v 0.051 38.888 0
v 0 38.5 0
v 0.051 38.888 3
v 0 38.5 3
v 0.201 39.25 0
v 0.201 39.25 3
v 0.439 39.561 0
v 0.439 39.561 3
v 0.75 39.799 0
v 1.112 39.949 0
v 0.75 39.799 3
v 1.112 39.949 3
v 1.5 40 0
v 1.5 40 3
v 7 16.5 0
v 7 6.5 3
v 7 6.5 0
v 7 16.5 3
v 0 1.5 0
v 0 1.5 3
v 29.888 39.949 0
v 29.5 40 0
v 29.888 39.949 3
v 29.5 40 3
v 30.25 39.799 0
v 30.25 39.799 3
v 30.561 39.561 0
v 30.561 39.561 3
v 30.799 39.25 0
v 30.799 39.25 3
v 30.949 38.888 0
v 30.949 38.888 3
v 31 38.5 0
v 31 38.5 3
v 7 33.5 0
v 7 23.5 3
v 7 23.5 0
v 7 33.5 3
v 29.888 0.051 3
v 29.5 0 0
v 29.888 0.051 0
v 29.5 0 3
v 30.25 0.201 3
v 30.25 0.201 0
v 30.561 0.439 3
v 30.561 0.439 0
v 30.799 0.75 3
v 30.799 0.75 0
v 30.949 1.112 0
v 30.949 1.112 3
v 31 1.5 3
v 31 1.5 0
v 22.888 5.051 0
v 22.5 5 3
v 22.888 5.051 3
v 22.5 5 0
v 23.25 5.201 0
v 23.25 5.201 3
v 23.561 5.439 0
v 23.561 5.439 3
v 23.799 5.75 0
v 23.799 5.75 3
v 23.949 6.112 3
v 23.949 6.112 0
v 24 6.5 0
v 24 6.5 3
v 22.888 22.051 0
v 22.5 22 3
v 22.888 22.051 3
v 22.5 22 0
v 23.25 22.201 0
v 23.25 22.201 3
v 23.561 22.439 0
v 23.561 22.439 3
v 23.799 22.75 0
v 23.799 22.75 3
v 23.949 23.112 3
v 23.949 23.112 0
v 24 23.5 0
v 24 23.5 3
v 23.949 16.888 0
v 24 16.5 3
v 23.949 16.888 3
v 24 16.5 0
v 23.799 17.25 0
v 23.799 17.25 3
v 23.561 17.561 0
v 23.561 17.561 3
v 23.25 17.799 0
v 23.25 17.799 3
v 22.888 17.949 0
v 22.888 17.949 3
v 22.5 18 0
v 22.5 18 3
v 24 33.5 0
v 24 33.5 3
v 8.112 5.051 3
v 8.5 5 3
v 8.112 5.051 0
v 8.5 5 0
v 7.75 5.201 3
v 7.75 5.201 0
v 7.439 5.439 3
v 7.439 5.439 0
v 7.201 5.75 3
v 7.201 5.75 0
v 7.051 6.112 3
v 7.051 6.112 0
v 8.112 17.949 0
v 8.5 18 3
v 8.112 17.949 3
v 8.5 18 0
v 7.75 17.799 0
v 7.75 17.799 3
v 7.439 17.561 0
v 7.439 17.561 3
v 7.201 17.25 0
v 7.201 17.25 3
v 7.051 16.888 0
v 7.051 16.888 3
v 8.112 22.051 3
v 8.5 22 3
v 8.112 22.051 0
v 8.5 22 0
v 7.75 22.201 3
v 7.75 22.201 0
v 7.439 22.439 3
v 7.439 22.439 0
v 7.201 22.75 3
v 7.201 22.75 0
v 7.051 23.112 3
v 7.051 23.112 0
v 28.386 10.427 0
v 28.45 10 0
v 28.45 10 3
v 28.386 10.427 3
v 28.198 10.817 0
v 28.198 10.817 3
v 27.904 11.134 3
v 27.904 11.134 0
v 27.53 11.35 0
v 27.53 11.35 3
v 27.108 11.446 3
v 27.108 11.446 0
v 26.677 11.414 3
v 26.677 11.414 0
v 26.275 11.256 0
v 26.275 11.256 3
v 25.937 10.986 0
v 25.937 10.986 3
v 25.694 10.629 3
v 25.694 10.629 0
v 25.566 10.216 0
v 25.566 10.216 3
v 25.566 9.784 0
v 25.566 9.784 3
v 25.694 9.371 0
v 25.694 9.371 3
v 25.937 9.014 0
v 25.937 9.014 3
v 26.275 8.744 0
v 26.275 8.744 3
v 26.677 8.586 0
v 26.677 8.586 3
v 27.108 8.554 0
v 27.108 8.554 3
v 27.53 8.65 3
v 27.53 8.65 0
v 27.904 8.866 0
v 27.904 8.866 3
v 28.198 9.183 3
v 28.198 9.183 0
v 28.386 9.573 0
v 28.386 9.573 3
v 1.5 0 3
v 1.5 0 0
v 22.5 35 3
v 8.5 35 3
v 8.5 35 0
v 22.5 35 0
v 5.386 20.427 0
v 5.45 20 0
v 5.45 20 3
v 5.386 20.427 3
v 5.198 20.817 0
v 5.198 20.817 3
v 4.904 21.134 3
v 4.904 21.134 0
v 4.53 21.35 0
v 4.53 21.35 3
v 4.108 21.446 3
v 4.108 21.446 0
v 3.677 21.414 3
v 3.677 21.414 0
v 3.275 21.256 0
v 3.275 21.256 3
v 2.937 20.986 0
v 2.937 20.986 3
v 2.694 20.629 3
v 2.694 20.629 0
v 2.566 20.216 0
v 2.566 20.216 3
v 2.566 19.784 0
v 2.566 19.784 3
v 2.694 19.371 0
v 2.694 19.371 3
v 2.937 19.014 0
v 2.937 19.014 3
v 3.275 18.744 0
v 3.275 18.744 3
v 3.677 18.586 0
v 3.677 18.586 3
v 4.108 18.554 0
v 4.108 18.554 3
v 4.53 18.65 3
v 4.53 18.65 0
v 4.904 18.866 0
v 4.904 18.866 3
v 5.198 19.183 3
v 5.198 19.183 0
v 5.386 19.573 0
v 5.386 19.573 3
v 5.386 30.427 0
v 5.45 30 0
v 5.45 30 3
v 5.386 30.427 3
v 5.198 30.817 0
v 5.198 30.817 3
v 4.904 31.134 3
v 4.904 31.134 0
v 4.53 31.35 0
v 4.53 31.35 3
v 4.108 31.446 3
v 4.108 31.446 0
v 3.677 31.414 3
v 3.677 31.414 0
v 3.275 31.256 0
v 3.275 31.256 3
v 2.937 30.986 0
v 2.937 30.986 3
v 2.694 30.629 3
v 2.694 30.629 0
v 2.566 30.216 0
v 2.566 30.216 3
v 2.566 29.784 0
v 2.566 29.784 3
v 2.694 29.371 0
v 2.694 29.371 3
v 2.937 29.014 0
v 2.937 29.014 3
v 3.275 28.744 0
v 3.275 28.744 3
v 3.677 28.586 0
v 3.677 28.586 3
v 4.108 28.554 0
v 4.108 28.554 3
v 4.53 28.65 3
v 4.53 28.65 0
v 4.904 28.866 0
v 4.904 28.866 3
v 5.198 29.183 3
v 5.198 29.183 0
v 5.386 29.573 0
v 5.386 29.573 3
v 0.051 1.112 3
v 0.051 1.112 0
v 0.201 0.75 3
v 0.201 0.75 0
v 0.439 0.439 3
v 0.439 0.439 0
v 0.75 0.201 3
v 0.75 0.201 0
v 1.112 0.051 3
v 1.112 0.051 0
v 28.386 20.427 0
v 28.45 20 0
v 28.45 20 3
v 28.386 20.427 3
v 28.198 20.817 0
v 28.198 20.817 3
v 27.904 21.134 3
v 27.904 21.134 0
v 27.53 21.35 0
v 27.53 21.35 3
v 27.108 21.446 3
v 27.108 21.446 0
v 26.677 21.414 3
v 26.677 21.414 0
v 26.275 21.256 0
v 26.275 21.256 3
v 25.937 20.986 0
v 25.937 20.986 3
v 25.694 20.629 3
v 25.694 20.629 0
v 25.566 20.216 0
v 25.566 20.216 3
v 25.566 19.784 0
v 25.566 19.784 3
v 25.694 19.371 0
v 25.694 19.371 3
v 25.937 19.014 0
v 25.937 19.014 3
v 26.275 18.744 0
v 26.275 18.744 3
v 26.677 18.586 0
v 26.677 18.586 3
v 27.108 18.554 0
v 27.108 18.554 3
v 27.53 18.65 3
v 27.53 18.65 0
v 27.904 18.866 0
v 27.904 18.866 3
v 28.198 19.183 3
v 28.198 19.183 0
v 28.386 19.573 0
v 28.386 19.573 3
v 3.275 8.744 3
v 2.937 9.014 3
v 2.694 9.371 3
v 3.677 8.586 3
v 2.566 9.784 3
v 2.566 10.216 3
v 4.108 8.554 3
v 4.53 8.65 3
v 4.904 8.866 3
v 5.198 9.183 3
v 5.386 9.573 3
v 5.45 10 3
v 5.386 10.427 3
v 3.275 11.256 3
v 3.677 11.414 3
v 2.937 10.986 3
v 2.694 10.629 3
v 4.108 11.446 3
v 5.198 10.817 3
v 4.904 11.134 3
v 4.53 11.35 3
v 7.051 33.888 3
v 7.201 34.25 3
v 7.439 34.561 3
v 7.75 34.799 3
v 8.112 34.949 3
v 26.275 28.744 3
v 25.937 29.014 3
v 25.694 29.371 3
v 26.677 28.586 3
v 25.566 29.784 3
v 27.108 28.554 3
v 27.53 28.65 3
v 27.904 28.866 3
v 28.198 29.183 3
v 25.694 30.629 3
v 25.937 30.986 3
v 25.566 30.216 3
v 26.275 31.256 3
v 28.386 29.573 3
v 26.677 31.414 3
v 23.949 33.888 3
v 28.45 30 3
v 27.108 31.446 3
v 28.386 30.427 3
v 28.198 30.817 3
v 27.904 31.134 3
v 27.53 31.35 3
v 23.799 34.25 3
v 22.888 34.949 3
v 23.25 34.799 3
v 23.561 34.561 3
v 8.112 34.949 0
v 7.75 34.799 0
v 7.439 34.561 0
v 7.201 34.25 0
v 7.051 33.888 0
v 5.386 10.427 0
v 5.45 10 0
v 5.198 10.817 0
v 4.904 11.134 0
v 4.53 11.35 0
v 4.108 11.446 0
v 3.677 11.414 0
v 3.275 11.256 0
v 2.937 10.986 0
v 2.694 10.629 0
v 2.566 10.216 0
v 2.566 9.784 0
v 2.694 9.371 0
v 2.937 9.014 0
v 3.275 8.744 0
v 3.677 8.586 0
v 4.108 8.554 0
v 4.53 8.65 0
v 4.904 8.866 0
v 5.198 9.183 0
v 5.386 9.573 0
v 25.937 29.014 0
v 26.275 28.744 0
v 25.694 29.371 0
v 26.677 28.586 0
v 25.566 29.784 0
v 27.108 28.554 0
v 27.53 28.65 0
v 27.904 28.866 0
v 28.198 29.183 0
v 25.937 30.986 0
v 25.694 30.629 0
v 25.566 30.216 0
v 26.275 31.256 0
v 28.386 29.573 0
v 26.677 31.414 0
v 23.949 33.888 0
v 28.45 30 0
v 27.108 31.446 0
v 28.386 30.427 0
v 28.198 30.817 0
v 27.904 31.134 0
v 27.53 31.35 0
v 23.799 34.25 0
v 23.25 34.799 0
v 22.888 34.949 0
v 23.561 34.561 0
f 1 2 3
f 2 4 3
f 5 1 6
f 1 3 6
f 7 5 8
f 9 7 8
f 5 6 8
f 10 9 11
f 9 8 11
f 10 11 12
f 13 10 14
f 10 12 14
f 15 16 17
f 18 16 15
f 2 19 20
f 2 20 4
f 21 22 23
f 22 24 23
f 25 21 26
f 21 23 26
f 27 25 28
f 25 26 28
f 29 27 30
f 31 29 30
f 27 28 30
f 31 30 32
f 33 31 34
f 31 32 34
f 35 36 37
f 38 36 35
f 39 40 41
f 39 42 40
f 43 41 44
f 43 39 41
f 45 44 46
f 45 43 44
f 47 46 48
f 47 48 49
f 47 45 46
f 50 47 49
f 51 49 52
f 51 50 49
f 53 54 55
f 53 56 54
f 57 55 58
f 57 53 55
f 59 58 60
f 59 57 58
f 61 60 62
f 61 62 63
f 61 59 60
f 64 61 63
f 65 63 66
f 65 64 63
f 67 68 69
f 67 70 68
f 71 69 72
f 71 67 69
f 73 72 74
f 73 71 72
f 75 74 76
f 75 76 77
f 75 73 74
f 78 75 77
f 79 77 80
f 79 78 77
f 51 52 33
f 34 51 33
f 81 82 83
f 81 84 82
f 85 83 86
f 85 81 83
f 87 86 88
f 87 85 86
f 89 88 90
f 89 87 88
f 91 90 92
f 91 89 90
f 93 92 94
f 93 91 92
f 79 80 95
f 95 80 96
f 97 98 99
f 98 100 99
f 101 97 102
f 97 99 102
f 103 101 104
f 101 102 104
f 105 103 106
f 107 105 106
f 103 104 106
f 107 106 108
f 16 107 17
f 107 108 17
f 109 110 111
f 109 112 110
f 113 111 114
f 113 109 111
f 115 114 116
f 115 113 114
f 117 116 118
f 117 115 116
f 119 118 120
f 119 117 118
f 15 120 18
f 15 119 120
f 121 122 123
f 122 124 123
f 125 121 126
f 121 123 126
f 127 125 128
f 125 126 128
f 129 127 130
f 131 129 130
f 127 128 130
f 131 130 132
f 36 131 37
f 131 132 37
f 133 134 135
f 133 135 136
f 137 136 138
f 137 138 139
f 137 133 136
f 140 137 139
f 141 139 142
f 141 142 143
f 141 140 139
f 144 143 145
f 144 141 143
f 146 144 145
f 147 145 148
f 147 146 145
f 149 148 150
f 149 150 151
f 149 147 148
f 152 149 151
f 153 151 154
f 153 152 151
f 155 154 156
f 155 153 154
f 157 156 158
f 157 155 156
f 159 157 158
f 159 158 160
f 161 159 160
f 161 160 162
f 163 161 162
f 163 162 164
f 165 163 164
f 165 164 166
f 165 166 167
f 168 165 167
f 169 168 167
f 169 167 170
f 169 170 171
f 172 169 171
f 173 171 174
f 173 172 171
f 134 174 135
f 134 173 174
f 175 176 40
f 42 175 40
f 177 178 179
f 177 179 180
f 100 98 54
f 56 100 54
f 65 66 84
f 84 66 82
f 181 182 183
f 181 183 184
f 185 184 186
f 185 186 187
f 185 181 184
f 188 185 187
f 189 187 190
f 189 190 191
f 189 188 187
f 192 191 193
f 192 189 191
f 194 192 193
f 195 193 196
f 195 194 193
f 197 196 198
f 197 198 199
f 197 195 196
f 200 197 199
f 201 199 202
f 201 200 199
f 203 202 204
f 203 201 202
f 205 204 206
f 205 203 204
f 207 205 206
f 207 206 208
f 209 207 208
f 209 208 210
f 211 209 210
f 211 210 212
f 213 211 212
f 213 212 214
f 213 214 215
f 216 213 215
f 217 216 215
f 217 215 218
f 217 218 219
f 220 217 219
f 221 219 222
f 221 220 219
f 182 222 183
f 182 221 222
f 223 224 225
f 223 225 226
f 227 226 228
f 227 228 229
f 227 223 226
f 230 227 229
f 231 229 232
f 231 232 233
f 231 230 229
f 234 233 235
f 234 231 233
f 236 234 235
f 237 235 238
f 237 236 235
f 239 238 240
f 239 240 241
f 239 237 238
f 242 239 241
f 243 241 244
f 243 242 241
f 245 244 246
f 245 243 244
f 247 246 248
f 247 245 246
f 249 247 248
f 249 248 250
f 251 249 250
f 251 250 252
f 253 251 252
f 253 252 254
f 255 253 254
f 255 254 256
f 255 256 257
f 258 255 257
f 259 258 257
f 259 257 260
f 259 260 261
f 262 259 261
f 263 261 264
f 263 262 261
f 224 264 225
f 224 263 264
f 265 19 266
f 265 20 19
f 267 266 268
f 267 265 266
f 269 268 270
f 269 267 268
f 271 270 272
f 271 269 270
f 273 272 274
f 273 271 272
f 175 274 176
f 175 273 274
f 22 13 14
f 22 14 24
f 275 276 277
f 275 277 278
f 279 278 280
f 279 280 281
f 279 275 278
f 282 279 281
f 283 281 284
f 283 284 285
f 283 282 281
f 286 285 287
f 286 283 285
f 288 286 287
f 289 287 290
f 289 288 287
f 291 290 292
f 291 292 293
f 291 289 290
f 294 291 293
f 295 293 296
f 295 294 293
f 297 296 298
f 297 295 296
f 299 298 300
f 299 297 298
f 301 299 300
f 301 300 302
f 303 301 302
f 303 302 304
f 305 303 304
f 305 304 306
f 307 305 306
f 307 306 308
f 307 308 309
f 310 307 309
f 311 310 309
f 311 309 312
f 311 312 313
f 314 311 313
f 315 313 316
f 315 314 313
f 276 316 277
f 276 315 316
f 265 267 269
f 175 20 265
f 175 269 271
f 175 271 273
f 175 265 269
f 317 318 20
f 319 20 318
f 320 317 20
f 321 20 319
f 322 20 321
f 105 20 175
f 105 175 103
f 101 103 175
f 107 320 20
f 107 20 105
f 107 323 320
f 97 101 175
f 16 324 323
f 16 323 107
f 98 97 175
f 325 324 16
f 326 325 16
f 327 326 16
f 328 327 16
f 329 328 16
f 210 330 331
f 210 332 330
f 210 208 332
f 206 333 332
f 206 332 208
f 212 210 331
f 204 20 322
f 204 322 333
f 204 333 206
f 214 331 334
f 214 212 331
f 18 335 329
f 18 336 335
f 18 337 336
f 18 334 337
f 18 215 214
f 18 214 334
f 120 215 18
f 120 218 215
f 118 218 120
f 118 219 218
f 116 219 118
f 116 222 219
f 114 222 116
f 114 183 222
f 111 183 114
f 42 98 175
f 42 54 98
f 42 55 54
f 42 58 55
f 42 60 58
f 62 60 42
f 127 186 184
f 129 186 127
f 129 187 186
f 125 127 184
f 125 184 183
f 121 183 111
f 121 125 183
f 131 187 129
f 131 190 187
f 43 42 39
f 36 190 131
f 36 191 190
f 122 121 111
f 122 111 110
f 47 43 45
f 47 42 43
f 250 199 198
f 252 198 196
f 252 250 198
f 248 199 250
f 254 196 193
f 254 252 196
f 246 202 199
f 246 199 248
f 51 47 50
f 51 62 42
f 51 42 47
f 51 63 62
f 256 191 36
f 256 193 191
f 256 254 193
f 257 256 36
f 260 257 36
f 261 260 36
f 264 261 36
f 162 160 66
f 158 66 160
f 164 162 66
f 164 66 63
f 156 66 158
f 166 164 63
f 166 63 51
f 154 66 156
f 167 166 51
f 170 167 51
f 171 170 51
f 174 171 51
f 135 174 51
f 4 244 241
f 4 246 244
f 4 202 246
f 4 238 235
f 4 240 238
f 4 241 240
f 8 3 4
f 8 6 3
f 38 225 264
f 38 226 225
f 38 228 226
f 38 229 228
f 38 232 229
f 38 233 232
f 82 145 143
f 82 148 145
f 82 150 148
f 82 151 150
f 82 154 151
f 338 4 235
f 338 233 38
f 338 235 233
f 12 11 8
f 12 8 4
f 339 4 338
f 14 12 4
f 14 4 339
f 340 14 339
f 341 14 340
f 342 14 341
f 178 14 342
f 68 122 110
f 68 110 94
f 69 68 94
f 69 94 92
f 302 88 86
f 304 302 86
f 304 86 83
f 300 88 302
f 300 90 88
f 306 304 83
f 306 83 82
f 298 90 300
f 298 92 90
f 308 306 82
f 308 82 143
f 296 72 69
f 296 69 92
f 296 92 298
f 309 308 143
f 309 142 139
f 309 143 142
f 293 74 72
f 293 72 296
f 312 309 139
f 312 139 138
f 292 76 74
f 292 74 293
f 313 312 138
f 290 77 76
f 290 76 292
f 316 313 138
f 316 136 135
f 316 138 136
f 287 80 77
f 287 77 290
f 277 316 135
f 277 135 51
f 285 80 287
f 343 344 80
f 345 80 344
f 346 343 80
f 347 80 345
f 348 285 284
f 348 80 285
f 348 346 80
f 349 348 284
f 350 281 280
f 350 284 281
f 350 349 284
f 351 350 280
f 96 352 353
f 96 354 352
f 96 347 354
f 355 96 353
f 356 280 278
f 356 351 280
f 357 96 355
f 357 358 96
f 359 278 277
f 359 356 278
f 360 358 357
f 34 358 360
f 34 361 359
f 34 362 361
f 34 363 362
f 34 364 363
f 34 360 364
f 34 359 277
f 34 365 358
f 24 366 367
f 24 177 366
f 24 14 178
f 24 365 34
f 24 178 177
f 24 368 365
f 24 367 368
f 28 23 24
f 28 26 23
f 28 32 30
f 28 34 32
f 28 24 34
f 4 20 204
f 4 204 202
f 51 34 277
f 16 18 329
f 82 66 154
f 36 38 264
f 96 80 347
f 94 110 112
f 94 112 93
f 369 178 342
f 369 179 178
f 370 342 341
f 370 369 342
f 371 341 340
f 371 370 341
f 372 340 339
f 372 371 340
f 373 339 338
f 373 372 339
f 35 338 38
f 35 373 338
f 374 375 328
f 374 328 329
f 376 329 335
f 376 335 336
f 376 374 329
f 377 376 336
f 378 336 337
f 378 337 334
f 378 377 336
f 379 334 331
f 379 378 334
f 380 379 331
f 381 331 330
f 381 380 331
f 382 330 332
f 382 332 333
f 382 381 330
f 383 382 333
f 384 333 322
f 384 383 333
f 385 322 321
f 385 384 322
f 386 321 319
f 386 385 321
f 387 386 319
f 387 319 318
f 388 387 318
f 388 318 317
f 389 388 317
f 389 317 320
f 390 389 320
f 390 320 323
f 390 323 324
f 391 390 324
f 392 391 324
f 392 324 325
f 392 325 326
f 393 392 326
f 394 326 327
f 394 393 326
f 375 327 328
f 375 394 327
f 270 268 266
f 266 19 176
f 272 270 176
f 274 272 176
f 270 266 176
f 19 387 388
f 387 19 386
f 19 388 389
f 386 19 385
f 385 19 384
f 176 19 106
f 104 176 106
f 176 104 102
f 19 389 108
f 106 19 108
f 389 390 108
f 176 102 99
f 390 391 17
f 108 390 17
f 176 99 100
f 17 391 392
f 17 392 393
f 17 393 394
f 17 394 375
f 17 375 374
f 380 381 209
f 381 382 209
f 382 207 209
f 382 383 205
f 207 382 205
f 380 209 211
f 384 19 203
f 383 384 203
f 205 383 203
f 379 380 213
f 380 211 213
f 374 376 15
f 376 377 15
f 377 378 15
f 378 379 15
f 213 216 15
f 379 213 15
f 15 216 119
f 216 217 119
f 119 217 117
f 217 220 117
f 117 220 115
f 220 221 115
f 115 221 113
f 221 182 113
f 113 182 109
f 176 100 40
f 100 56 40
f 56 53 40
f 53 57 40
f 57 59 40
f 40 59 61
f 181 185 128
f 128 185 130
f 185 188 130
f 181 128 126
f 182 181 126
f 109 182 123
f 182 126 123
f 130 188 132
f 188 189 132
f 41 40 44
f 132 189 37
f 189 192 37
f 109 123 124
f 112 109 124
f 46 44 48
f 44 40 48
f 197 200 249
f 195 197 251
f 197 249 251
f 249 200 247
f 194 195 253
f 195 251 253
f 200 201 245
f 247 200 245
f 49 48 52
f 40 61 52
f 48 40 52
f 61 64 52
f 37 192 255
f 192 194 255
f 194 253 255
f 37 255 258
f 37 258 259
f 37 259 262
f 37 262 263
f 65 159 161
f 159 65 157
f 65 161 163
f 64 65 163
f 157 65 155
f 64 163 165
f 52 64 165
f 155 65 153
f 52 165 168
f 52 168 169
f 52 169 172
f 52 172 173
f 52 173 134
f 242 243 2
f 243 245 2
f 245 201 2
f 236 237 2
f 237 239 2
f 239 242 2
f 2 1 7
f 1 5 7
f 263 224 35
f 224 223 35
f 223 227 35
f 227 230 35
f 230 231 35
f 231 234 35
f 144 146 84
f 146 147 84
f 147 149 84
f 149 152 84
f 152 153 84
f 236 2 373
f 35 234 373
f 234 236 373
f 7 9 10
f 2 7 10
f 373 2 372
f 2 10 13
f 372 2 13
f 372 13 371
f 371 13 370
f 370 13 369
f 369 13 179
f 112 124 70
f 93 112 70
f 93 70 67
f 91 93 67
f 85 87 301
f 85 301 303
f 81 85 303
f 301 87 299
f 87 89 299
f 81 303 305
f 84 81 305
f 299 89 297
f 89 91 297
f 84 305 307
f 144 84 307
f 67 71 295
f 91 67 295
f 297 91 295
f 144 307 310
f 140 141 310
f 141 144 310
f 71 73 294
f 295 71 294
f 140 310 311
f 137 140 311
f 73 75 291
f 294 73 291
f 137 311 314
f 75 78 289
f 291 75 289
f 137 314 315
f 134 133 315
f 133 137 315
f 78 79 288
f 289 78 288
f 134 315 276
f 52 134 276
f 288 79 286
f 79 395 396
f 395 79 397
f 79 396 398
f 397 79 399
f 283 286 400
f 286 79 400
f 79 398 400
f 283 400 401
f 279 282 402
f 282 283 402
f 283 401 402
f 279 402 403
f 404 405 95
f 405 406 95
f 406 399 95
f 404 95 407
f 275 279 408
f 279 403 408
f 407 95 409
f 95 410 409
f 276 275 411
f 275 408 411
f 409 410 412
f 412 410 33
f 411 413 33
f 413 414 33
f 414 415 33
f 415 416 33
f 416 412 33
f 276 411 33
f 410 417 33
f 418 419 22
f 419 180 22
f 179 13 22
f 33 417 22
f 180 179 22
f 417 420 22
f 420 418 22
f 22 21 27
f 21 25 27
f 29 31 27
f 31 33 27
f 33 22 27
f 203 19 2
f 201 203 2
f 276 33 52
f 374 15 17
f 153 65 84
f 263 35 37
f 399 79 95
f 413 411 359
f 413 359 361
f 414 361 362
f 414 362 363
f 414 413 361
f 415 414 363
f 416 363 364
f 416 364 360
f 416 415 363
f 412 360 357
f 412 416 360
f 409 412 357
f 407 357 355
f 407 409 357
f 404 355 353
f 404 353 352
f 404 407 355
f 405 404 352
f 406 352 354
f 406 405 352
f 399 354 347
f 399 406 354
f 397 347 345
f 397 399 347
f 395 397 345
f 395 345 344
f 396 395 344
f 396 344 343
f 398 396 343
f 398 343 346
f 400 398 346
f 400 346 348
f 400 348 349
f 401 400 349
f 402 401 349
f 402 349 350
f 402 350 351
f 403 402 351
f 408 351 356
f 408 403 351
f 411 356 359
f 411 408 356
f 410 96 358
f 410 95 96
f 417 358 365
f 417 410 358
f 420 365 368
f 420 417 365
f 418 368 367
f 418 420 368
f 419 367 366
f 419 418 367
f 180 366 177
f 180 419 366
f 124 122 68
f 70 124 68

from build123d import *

# Parameters (mm, degrees)
SKETCH_1_W          = 31
SKETCH_1_H          = 40
SKETCH_1_R          = 1.45
EXTRUDE_1_DEPTH     = 3
SKETCH_2_W          = 17
SKETCH_2_H          = 13
CUT_EXTRUDE_1_DEPTH = 3
FILLET_1_R          = 1.5


with BuildPart() as part:
    # 草图1 → 凸台-拉伸1 (new body)
    with BuildSketch(Plane.XY):
        with Locations((15.5, 20)):
            Rectangle(SKETCH_1_W, SKETCH_1_H)
        with Locations((4, 30)):
            Circle(SKETCH_1_R, mode=Mode.SUBTRACT)
        with Locations((4, 20)):
            Circle(SKETCH_1_R, mode=Mode.SUBTRACT)
        with Locations((4, 10)):
            Circle(SKETCH_1_R, mode=Mode.SUBTRACT)
        with Locations((27, 30)):
            Circle(SKETCH_1_R, mode=Mode.SUBTRACT)
        with Locations((27, 20)):
            Circle(SKETCH_1_R, mode=Mode.SUBTRACT)
        with Locations((27, 10)):
            Circle(SKETCH_1_R, mode=Mode.SUBTRACT)
    extrude(amount=EXTRUDE_1_DEPTH)

    # 草图2 → 切除-拉伸1 (cut)
    with BuildSketch(Plane.XY.offset(3)):
        with Locations((15.5, 28.5)):
            Rectangle(SKETCH_2_W, SKETCH_2_H)
        with Locations((15.5, 11.5)):
            Rectangle(SKETCH_2_W, SKETCH_2_H)
    extrude(amount=-CUT_EXTRUDE_1_DEPTH, mode=Mode.SUBTRACT)

    # 圆角1
    fillet_1_edges = [part.edges().sort_by_distance(p)[0] for p in [
        (7, 22, 1.5),
        (7, 35, 1.5),
        (24, 35, 1.5),
        (24, 22, 1.5),
        (7, 5, 1.5),
        (7, 18, 1.5),
        (24, 18, 1.5),
        (24, 5, 1.5),
        (0, 40, 1.5),
        (31, 40, 1.5),
        (31, 0, 1.5),
        (0, 0, 1.5),
    ]]
    fillet(fillet_1_edges, radius=FILLET_1_R)


solid = part.part
